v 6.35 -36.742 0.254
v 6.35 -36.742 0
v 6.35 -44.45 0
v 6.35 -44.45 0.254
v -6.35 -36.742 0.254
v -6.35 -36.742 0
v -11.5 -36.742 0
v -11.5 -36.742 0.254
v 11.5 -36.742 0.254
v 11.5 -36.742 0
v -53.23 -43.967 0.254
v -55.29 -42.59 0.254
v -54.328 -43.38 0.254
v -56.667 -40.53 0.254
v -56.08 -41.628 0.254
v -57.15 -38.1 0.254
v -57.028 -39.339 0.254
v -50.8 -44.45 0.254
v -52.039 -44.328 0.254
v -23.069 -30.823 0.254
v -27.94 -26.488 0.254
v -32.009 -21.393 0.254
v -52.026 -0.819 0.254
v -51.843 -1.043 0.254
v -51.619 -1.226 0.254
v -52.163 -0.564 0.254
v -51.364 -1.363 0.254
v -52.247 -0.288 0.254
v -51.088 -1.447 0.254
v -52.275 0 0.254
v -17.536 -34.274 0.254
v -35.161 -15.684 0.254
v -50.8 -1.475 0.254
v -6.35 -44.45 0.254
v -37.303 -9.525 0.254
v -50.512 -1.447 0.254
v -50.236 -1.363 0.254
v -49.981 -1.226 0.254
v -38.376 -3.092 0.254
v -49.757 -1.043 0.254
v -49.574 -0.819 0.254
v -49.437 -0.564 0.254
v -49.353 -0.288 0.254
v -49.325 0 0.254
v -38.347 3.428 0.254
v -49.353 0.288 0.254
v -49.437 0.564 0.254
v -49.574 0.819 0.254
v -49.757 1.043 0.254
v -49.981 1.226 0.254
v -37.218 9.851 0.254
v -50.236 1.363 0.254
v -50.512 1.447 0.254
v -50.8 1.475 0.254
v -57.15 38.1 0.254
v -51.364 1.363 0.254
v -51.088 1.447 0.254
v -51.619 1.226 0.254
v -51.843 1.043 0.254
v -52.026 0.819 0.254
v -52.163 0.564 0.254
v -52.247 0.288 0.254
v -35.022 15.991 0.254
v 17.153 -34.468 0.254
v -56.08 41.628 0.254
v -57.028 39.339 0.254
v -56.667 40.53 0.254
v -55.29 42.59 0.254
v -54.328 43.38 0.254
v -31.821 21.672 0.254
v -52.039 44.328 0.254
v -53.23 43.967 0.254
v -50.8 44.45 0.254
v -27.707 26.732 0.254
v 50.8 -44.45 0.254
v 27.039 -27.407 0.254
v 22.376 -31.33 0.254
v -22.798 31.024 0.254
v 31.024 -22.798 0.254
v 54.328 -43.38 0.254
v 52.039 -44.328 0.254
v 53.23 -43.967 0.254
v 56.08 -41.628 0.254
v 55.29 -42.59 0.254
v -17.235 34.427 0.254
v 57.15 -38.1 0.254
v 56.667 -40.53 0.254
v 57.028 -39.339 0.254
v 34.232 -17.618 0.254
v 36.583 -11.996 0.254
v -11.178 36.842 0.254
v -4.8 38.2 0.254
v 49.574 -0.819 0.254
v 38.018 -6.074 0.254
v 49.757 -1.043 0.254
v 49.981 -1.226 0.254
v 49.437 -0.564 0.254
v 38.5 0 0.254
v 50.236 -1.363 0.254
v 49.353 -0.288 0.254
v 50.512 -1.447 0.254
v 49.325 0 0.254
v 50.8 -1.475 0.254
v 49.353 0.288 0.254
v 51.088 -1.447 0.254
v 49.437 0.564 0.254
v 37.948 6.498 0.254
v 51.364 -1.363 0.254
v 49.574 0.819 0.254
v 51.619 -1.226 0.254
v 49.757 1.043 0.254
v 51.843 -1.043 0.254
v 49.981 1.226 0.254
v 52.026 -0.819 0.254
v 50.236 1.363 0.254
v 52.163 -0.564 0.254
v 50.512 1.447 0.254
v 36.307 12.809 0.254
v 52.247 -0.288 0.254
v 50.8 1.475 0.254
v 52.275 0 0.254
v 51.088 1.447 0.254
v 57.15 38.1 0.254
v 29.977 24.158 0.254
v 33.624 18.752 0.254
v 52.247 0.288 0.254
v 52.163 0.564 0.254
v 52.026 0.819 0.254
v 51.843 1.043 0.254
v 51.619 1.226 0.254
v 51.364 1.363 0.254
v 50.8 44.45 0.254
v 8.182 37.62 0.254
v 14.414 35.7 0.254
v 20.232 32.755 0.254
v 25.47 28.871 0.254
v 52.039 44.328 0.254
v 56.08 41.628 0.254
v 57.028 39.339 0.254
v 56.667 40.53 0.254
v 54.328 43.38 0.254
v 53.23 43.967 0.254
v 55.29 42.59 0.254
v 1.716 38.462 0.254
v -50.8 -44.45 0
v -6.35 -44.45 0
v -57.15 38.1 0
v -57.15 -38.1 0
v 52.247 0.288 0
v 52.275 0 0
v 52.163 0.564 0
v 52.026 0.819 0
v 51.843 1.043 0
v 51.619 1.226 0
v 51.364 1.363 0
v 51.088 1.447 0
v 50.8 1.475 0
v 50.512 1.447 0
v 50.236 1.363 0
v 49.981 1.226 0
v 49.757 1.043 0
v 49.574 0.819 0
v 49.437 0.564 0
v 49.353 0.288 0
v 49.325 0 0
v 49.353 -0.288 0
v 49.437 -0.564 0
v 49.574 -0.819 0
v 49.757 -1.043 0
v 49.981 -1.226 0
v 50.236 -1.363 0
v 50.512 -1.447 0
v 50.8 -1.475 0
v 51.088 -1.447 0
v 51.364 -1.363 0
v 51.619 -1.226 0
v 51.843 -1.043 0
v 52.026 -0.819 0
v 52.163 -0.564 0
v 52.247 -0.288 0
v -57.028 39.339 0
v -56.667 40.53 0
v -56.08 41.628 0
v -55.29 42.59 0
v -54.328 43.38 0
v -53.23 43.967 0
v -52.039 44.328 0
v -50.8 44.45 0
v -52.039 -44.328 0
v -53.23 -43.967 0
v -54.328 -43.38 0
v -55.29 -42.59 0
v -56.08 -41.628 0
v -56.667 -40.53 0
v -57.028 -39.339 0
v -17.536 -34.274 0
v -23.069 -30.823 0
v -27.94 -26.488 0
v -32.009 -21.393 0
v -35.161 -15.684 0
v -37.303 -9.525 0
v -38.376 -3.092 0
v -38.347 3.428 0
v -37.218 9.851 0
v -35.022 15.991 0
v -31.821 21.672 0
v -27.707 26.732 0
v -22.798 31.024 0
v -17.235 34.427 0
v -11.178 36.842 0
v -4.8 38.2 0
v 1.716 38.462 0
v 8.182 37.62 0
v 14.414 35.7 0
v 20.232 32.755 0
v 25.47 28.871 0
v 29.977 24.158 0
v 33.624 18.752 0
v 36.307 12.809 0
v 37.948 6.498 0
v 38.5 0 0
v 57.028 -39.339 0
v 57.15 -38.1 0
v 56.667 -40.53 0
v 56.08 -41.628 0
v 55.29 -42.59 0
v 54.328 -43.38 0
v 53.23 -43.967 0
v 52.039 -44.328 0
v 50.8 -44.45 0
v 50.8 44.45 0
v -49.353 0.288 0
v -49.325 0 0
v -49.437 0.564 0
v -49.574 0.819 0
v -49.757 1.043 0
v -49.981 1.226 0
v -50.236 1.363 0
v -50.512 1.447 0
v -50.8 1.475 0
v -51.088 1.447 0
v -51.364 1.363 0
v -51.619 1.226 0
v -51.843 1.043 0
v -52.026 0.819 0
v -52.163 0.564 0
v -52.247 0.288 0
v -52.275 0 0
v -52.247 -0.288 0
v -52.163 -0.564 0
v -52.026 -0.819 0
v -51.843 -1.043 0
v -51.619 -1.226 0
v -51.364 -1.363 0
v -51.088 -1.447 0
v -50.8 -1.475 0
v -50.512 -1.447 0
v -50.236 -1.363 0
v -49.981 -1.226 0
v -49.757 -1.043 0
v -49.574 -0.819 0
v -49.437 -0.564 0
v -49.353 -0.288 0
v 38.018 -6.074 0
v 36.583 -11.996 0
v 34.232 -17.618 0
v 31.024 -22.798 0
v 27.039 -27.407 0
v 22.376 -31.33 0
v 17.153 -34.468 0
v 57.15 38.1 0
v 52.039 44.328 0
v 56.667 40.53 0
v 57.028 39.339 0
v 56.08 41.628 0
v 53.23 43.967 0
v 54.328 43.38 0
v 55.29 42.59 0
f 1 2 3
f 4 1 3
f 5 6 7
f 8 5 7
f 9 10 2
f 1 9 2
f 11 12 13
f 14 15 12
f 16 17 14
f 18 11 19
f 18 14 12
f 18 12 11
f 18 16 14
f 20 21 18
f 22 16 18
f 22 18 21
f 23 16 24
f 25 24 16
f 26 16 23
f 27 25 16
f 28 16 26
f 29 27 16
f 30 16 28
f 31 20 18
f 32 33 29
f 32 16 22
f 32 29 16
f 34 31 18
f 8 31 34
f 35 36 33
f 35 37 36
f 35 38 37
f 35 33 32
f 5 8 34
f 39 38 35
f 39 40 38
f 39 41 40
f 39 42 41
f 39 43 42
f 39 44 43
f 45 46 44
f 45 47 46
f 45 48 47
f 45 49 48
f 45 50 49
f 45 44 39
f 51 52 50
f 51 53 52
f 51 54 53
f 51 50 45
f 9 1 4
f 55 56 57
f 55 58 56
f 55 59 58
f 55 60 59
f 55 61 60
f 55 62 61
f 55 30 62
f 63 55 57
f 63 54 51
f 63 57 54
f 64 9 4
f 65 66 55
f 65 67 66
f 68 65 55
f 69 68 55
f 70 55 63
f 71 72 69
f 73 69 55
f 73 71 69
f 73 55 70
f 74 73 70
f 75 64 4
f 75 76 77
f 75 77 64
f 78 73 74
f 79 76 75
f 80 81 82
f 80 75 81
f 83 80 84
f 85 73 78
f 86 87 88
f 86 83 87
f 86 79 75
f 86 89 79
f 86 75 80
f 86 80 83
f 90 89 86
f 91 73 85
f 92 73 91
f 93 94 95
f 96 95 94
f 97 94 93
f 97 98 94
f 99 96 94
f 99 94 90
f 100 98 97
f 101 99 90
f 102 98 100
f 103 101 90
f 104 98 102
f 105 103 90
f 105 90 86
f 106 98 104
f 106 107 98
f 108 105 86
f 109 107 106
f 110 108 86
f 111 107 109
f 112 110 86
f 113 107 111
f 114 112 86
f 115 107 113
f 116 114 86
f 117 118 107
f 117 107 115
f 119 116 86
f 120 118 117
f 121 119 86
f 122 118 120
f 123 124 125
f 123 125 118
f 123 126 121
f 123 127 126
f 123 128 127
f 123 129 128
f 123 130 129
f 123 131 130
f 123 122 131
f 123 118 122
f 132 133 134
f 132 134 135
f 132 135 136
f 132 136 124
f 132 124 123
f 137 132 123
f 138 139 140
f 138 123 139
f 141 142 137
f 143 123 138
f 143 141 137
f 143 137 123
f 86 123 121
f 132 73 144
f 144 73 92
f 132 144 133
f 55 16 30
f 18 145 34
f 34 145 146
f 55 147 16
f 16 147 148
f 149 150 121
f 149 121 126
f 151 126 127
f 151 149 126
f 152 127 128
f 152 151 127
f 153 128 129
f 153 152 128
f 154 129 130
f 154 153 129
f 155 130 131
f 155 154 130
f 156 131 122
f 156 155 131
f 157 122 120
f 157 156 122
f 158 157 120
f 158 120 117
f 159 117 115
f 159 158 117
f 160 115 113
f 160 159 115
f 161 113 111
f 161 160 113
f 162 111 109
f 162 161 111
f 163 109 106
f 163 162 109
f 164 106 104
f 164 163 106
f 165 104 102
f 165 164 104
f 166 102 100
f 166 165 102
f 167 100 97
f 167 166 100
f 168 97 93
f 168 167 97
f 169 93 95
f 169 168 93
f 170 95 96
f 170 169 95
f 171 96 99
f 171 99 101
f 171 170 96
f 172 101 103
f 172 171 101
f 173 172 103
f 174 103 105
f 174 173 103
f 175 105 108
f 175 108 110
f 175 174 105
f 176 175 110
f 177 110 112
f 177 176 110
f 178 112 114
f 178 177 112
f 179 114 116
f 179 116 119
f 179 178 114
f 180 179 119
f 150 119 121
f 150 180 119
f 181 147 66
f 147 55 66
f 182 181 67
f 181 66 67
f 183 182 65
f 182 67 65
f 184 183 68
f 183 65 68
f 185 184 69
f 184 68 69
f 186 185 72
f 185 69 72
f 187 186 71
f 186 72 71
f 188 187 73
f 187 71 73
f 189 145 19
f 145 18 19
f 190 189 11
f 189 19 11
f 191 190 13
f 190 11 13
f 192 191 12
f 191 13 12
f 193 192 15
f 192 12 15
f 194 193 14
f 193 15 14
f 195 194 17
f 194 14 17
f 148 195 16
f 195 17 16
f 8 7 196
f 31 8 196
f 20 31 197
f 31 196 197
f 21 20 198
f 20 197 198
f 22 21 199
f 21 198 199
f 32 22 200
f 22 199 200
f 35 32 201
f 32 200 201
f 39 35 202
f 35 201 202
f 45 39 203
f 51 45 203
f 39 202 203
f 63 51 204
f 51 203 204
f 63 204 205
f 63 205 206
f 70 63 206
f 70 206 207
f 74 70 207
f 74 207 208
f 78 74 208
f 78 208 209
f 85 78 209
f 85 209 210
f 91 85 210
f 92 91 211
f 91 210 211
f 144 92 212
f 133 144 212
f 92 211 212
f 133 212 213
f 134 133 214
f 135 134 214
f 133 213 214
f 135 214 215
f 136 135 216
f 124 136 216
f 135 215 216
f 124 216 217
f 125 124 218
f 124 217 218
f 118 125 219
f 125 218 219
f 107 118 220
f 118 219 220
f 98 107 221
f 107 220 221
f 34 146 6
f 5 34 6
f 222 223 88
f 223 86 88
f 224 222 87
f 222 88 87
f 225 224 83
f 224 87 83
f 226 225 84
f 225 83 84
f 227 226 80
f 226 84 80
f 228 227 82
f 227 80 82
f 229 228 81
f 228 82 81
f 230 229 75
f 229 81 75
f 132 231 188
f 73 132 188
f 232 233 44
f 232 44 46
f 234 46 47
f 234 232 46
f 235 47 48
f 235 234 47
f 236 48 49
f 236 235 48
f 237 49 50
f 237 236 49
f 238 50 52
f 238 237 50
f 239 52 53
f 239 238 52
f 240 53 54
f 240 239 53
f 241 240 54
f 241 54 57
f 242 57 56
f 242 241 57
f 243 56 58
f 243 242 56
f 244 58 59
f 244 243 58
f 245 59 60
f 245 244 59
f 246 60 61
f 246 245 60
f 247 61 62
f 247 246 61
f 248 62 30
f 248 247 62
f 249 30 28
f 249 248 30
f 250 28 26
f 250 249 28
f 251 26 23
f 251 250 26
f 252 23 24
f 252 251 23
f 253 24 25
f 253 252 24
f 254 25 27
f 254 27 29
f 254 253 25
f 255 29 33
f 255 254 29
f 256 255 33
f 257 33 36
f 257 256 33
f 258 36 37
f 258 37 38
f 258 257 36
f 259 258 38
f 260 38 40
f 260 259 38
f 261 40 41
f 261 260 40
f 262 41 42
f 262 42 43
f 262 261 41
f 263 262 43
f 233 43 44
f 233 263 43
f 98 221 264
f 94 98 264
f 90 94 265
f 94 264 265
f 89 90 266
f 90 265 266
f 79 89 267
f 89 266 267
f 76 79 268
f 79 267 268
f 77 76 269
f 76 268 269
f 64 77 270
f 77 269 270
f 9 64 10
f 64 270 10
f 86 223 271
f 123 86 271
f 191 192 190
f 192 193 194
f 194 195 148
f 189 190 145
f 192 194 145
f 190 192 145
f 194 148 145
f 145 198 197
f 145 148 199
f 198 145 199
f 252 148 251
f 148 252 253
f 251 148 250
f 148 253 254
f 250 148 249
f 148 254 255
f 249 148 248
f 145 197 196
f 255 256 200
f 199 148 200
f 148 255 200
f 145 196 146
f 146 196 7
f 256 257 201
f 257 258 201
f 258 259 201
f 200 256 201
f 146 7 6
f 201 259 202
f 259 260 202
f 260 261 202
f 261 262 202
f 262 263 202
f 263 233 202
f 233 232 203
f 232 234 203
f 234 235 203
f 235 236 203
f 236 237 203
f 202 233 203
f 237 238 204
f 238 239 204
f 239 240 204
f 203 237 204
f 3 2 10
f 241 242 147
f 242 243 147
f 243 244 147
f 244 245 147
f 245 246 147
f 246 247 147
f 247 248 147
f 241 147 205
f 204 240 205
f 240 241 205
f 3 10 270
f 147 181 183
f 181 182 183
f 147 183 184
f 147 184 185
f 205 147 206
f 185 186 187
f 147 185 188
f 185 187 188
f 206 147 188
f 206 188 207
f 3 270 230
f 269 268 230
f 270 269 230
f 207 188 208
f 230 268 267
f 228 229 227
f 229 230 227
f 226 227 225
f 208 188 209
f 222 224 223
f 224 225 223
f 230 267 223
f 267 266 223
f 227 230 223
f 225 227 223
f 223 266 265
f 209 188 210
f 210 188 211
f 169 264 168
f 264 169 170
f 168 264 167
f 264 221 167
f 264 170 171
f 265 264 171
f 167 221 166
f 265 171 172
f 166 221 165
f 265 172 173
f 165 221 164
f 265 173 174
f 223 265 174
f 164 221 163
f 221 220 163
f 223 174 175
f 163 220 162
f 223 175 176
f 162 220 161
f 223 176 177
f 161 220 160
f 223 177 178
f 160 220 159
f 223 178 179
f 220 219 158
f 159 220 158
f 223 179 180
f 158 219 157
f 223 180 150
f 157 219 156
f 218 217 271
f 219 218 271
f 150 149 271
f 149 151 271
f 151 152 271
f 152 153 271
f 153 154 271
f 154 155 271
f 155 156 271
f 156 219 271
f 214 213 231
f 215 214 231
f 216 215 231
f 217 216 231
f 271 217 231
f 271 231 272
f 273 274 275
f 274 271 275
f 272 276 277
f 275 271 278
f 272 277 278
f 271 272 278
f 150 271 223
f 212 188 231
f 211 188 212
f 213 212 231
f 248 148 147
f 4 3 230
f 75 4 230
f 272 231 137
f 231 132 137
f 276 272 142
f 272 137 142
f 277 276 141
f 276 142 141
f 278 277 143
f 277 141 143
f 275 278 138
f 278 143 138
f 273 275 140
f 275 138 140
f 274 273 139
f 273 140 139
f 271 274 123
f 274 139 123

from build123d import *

# Parameters (mm, degrees)
SKETCH2_R           = 1.475
BOSS_EXTRUDE1_DEPTH = 0.254
FILLET1_R           = 6.35


with BuildPart() as part:
    # Sketch2 → Boss-Extrude1 (new body)
    # profile 1 of 3: a face of its own
    with BuildSketch(Plane.XY):
        with BuildLine():
            ThreePointArc((-6.35, -37.972720471), (-8.946176851, -37.446173633), (-11.5, -36.742346142))
            ThreePointArc((-11.5, -36.742346142), (-22.79802623, 31.024184115), (38.5, 0))
            ThreePointArc((38.5, 0), (31.024184115, -22.79802623), (11.5, -36.742346142))
            ThreePointArc((11.5, -36.742346142), (8.946176851, -37.446173633), (6.35, -37.972720471))
            Line((6.35, -37.972720471), (6.35, -44.45))
            Line((6.35, -44.45), (57.15, -44.45))
            Line((57.15, -44.45), (57.15, 44.45))
            Line((57.15, 44.45), (-57.15, 44.45))
            Line((-57.15, 44.45), (-57.15, -44.45))
            Line((-57.15, -44.45), (-6.35, -44.45))
            Line((-6.35, -44.45), (-6.35, -37.972720471))
        make_face()
        with Locations((-50.8, 0)):
            Circle(SKETCH2_R, mode=Mode.SUBTRACT)
        with Locations((50.8, 0)):
            Circle(SKETCH2_R, mode=Mode.SUBTRACT)
    # profile 2 of 3: a face of its own
    with BuildSketch(Plane.XY):
        with BuildLine():
            Line((11.5, -36.742346142), (6.35, -36.742346142))
            Line((6.35, -36.742346142), (6.35, -37.972720471))
            ThreePointArc((6.35, -37.972720471), (8.946176851, -37.446173633), (11.5, -36.742346142))
        make_face()
    # profile 3 of 3: a face of its own
    with BuildSketch(Plane.XY):
        with BuildLine():
            Line((-6.35, -36.742346142), (-11.5, -36.742346142))
            ThreePointArc((-11.5, -36.742346142), (-8.946176851, -37.446173633), (-6.35, -37.972720471))
            Line((-6.35, -37.972720471), (-6.35, -36.742346142))
        make_face()
    extrude(amount=BOSS_EXTRUDE1_DEPTH)

    # Fillet1
    fillet1_edges = [part.edges().sort_by_distance(p)[0] for p in [
        (-57.15, -44.45, 0.127),
        (-57.15, 44.45, 0.127),
        (57.15, 44.45, 0.127),
        (57.15, -44.45, 0.127),
    ]]
    fillet(fillet1_edges, radius=FILLET1_R)


solid = part.part
